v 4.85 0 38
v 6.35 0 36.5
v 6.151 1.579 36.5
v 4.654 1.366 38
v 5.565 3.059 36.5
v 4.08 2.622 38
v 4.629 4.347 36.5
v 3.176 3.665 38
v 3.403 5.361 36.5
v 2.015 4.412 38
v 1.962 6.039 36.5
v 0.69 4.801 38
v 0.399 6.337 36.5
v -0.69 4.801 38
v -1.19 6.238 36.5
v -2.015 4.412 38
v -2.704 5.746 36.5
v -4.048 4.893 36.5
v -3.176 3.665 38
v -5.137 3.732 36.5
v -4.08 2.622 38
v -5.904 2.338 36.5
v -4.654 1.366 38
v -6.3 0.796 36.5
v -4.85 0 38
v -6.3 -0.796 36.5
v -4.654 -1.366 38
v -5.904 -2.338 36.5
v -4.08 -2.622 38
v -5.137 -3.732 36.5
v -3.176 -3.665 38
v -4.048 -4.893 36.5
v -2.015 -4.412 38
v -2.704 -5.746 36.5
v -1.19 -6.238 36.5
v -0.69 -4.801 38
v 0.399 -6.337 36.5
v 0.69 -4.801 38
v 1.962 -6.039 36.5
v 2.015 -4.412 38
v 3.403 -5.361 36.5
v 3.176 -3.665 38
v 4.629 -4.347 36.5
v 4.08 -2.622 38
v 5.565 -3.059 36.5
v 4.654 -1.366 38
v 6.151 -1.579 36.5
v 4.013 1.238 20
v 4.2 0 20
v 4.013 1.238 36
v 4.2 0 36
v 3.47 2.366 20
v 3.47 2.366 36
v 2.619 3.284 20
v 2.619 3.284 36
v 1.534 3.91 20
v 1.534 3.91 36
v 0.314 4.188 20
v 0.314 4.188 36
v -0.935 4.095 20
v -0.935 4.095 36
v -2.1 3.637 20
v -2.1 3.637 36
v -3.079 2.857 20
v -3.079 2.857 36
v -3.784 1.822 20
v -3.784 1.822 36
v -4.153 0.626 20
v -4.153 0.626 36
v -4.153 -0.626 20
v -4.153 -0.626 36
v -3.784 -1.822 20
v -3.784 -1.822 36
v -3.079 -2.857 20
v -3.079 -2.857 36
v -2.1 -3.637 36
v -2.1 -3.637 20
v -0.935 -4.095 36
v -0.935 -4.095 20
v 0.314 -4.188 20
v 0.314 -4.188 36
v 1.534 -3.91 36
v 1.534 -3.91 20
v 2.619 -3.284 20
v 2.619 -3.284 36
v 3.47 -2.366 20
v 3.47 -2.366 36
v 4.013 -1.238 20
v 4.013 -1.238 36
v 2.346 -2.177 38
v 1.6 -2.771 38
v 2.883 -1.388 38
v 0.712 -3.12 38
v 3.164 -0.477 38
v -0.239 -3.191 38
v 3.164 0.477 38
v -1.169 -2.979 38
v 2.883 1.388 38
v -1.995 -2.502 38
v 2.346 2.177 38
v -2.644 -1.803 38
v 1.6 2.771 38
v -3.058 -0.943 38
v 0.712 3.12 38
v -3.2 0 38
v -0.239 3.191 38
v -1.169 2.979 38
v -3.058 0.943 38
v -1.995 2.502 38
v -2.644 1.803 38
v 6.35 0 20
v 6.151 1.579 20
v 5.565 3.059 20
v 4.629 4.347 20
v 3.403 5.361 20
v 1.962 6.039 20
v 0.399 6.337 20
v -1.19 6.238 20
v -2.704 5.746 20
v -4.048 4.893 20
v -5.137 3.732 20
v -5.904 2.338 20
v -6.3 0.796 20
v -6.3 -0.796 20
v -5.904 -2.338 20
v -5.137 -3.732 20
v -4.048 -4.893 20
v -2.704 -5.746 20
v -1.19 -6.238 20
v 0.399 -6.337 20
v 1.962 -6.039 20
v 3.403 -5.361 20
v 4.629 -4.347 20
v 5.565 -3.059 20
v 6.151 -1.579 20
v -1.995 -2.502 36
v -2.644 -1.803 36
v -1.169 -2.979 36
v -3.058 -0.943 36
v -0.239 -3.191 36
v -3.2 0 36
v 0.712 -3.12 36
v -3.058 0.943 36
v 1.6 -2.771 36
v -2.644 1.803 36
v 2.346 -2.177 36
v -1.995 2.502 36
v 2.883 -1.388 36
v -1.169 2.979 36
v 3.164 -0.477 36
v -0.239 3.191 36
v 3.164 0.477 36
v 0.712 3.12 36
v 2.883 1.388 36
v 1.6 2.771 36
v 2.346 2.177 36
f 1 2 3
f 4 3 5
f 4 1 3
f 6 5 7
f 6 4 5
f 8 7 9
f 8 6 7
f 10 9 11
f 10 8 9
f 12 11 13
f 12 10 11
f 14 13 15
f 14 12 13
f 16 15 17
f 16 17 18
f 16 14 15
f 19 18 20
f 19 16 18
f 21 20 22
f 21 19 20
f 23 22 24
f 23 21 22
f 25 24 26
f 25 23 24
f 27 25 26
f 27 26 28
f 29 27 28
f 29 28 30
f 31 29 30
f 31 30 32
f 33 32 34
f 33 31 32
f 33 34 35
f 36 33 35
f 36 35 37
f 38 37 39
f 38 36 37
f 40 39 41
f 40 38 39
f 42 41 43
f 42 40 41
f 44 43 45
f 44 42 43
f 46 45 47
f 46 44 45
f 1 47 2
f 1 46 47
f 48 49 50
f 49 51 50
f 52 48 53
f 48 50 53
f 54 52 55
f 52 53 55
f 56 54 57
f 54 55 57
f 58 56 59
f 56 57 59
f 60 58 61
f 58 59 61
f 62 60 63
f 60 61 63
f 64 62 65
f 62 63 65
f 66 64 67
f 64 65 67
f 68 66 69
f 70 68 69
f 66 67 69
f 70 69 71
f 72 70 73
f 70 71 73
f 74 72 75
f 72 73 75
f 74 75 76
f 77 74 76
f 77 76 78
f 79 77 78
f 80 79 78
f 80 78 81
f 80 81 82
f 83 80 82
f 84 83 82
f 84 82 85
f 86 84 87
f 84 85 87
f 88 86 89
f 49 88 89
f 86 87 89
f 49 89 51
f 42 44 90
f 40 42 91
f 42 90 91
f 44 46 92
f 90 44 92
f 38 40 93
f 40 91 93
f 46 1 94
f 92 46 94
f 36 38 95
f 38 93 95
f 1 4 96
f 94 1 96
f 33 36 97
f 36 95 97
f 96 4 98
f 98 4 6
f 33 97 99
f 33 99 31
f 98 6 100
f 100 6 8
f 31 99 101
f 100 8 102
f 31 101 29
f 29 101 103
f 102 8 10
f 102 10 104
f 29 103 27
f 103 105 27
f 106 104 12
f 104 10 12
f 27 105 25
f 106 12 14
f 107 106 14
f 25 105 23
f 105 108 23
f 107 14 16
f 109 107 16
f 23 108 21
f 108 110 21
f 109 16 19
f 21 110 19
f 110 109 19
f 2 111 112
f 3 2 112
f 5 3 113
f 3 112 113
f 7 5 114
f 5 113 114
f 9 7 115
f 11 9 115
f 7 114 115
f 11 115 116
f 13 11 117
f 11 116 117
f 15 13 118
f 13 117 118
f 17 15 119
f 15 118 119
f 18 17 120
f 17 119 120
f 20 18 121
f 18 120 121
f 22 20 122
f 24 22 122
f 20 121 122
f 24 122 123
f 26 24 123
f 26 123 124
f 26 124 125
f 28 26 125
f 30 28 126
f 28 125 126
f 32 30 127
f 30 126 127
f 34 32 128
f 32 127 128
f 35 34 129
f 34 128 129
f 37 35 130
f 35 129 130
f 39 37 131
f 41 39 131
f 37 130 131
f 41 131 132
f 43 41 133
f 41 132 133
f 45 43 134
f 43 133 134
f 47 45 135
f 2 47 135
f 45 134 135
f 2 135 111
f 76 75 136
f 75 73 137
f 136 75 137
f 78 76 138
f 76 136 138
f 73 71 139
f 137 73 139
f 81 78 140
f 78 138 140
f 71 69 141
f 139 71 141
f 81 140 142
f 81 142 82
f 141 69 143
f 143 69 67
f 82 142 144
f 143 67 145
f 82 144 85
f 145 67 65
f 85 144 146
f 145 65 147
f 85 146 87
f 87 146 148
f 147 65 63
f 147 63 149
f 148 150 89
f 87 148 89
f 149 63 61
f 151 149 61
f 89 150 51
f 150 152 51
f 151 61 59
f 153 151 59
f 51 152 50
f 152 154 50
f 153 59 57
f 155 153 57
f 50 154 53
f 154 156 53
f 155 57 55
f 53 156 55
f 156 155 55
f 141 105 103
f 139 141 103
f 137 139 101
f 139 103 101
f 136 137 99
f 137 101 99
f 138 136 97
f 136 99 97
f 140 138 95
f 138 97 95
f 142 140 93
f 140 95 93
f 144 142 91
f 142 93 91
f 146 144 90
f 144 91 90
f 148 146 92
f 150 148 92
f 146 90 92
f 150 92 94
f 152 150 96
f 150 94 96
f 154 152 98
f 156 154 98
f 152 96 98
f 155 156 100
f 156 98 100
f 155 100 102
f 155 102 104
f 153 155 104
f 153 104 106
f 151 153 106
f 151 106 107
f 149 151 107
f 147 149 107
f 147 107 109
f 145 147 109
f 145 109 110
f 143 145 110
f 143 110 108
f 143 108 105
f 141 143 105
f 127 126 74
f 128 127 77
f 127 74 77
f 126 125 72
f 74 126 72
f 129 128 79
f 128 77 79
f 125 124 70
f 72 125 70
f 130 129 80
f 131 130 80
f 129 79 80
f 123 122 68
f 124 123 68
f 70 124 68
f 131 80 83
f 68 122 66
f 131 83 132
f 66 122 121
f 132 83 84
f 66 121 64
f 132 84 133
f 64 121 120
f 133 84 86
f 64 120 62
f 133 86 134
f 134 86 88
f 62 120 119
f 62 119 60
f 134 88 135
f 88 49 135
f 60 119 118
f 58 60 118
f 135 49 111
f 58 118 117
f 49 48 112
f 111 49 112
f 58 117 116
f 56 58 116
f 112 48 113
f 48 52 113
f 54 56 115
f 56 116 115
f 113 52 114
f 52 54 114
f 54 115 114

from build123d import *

# Parameters (mm, degrees)
SKETCH011_R  = 3.2
POCKET_DEPTH = 18.001
CHAMFER_SIZE = 1.5


with BuildPart() as part:
    # Sketch010 → Revolution001 (revolve)
    with BuildSketch(Plane.XZ):
        Polygon((4.2, 20), (4.2, 36), (0, 36), (0, 38), (6.35, 38), (6.35, 20), align=None)
    revolve(axis=Axis((0, 0, 0), (0, 0, 1)))

    # Sketch011 → Pocket (cut, through all)
    with BuildSketch(Plane(origin=(0, 0, 38), x_dir=(-1, 0, 0), z_dir=(0, 0, 1))):
        Circle(SKETCH011_R)
    extrude(amount=-POCKET_DEPTH, mode=Mode.SUBTRACT)

    # Chamfer
    chamfer_edges = [part.edges().sort_by_distance(p)[0] for p in [
        (-6.35, 0, 38),
    ]]
    chamfer(chamfer_edges, length=CHAMFER_SIZE)


solid = part.part
